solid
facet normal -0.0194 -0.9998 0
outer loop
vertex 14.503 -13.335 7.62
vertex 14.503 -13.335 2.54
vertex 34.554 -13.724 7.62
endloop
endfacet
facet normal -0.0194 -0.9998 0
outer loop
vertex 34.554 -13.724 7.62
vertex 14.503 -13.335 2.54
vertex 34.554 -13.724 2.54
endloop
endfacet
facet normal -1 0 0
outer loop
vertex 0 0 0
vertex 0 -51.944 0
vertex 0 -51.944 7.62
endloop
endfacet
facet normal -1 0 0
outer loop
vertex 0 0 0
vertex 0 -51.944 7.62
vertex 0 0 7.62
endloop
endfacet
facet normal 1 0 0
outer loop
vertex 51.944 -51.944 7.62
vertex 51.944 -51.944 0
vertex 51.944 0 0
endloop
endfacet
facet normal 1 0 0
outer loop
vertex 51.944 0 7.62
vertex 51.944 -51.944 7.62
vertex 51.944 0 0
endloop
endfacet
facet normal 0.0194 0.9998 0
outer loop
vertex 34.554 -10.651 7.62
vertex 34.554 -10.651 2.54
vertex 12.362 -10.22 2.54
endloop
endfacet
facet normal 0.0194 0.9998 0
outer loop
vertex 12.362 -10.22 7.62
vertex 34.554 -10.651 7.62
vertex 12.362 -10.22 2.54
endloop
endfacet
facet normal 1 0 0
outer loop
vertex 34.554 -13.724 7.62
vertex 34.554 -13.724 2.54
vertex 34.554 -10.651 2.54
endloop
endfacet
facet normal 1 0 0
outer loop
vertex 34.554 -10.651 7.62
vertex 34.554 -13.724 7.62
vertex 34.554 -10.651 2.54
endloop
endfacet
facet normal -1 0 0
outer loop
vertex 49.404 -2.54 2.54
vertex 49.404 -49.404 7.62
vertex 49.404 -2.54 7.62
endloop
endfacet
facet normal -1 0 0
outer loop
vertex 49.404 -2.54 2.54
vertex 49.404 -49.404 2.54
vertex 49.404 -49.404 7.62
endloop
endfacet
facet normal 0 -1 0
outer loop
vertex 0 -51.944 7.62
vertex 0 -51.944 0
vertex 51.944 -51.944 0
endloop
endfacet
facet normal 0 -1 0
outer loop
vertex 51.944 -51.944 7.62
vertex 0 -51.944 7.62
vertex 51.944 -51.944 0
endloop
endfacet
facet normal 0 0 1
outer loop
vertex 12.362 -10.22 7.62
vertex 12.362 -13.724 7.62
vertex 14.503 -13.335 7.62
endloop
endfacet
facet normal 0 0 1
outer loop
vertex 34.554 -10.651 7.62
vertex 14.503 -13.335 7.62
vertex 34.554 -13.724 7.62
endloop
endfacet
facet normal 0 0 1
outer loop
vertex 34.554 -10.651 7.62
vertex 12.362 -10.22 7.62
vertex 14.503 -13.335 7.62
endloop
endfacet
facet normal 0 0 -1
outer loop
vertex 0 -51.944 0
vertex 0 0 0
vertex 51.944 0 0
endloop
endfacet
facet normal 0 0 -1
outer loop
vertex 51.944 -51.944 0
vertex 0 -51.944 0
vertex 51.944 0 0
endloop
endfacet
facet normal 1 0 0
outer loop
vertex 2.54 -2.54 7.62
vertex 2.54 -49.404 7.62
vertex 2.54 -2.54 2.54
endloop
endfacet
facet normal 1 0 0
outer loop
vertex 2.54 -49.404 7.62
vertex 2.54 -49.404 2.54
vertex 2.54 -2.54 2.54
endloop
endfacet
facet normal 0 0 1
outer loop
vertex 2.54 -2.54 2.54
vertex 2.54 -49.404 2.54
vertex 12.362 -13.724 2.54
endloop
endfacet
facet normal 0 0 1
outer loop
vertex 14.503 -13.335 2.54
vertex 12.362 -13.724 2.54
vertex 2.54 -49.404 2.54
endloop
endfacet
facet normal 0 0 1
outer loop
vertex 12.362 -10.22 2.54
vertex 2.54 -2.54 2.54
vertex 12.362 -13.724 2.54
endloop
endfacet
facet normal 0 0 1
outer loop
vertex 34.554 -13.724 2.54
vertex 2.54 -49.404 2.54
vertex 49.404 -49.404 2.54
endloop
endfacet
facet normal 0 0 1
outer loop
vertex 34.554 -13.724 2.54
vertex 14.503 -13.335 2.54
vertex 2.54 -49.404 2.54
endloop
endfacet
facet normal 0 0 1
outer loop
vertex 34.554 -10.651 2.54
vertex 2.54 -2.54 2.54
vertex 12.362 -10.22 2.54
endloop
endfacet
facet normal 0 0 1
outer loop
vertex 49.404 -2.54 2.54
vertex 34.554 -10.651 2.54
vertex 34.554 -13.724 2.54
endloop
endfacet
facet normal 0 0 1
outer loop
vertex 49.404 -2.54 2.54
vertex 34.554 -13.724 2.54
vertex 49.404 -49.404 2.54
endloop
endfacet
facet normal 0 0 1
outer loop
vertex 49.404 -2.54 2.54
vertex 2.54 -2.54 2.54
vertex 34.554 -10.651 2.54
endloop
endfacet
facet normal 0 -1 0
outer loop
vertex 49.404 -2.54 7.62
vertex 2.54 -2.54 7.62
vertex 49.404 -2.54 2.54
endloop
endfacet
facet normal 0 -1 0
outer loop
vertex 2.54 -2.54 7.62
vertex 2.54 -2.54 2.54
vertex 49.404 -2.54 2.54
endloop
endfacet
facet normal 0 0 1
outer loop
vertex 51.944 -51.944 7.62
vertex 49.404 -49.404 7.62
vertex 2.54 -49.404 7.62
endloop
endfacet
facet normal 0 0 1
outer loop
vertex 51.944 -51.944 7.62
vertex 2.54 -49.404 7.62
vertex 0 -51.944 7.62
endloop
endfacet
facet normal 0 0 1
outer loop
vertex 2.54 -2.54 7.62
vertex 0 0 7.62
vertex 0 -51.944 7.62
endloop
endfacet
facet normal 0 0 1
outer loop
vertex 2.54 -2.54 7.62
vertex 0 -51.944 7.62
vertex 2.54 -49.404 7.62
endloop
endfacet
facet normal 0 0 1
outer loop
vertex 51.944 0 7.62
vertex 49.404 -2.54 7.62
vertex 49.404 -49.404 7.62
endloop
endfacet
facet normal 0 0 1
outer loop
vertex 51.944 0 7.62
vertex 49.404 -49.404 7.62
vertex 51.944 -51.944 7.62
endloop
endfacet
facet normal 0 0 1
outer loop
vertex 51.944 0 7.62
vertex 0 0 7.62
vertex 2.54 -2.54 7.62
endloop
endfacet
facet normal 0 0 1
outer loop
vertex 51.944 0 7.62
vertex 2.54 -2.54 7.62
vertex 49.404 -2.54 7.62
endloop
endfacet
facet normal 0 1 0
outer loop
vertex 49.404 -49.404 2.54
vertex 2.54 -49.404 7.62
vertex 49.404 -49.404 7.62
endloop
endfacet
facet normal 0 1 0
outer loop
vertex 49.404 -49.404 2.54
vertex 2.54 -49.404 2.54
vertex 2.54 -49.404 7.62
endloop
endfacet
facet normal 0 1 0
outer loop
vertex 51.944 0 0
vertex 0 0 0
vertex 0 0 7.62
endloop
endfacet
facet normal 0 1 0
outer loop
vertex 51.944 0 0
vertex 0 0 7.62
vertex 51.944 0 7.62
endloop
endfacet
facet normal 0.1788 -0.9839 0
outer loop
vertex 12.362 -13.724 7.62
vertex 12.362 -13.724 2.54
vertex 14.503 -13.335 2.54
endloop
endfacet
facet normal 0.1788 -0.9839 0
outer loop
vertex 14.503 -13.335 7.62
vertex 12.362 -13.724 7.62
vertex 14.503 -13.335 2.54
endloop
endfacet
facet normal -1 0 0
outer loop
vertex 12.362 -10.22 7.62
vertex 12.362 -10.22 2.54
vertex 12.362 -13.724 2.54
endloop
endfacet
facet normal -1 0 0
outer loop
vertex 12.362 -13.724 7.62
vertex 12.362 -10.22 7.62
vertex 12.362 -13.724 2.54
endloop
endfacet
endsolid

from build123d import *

# Parameters (mm, degrees)
F0_W     = 51.944476
F0_H     = 51.944479
F1_DEPTH = 7.62
F2_T     = -2.54
F5_DEPTH = 5.08


with BuildPart() as f1:
    # F0 (on Top) → F1 (new body)
    with BuildSketch(Plane.XY):
        with Locations((25.972238, -25.97224)):
            Rectangle(F0_W, F0_H)
    extrude(amount=F1_DEPTH)

    # F2
    f2_openings = [f1.faces().sort_by_distance(p)[0] for p in [
        (25.972238, -25.97224, 7.62),
    ]]
    offset(amount=F2_T, openings=f2_openings)

    # F3 (on face) → F5 (join)
    with BuildSketch(Plane.XY.offset(2.54)):
        Polygon((12.361643, -13.724343), (14.503031, -13.335001), (34.554198, -13.724343), (34.554198, -10.651178), (12.361643, -10.220256), align=None)
    extrude(amount=F5_DEPTH)


solid = f1.part
